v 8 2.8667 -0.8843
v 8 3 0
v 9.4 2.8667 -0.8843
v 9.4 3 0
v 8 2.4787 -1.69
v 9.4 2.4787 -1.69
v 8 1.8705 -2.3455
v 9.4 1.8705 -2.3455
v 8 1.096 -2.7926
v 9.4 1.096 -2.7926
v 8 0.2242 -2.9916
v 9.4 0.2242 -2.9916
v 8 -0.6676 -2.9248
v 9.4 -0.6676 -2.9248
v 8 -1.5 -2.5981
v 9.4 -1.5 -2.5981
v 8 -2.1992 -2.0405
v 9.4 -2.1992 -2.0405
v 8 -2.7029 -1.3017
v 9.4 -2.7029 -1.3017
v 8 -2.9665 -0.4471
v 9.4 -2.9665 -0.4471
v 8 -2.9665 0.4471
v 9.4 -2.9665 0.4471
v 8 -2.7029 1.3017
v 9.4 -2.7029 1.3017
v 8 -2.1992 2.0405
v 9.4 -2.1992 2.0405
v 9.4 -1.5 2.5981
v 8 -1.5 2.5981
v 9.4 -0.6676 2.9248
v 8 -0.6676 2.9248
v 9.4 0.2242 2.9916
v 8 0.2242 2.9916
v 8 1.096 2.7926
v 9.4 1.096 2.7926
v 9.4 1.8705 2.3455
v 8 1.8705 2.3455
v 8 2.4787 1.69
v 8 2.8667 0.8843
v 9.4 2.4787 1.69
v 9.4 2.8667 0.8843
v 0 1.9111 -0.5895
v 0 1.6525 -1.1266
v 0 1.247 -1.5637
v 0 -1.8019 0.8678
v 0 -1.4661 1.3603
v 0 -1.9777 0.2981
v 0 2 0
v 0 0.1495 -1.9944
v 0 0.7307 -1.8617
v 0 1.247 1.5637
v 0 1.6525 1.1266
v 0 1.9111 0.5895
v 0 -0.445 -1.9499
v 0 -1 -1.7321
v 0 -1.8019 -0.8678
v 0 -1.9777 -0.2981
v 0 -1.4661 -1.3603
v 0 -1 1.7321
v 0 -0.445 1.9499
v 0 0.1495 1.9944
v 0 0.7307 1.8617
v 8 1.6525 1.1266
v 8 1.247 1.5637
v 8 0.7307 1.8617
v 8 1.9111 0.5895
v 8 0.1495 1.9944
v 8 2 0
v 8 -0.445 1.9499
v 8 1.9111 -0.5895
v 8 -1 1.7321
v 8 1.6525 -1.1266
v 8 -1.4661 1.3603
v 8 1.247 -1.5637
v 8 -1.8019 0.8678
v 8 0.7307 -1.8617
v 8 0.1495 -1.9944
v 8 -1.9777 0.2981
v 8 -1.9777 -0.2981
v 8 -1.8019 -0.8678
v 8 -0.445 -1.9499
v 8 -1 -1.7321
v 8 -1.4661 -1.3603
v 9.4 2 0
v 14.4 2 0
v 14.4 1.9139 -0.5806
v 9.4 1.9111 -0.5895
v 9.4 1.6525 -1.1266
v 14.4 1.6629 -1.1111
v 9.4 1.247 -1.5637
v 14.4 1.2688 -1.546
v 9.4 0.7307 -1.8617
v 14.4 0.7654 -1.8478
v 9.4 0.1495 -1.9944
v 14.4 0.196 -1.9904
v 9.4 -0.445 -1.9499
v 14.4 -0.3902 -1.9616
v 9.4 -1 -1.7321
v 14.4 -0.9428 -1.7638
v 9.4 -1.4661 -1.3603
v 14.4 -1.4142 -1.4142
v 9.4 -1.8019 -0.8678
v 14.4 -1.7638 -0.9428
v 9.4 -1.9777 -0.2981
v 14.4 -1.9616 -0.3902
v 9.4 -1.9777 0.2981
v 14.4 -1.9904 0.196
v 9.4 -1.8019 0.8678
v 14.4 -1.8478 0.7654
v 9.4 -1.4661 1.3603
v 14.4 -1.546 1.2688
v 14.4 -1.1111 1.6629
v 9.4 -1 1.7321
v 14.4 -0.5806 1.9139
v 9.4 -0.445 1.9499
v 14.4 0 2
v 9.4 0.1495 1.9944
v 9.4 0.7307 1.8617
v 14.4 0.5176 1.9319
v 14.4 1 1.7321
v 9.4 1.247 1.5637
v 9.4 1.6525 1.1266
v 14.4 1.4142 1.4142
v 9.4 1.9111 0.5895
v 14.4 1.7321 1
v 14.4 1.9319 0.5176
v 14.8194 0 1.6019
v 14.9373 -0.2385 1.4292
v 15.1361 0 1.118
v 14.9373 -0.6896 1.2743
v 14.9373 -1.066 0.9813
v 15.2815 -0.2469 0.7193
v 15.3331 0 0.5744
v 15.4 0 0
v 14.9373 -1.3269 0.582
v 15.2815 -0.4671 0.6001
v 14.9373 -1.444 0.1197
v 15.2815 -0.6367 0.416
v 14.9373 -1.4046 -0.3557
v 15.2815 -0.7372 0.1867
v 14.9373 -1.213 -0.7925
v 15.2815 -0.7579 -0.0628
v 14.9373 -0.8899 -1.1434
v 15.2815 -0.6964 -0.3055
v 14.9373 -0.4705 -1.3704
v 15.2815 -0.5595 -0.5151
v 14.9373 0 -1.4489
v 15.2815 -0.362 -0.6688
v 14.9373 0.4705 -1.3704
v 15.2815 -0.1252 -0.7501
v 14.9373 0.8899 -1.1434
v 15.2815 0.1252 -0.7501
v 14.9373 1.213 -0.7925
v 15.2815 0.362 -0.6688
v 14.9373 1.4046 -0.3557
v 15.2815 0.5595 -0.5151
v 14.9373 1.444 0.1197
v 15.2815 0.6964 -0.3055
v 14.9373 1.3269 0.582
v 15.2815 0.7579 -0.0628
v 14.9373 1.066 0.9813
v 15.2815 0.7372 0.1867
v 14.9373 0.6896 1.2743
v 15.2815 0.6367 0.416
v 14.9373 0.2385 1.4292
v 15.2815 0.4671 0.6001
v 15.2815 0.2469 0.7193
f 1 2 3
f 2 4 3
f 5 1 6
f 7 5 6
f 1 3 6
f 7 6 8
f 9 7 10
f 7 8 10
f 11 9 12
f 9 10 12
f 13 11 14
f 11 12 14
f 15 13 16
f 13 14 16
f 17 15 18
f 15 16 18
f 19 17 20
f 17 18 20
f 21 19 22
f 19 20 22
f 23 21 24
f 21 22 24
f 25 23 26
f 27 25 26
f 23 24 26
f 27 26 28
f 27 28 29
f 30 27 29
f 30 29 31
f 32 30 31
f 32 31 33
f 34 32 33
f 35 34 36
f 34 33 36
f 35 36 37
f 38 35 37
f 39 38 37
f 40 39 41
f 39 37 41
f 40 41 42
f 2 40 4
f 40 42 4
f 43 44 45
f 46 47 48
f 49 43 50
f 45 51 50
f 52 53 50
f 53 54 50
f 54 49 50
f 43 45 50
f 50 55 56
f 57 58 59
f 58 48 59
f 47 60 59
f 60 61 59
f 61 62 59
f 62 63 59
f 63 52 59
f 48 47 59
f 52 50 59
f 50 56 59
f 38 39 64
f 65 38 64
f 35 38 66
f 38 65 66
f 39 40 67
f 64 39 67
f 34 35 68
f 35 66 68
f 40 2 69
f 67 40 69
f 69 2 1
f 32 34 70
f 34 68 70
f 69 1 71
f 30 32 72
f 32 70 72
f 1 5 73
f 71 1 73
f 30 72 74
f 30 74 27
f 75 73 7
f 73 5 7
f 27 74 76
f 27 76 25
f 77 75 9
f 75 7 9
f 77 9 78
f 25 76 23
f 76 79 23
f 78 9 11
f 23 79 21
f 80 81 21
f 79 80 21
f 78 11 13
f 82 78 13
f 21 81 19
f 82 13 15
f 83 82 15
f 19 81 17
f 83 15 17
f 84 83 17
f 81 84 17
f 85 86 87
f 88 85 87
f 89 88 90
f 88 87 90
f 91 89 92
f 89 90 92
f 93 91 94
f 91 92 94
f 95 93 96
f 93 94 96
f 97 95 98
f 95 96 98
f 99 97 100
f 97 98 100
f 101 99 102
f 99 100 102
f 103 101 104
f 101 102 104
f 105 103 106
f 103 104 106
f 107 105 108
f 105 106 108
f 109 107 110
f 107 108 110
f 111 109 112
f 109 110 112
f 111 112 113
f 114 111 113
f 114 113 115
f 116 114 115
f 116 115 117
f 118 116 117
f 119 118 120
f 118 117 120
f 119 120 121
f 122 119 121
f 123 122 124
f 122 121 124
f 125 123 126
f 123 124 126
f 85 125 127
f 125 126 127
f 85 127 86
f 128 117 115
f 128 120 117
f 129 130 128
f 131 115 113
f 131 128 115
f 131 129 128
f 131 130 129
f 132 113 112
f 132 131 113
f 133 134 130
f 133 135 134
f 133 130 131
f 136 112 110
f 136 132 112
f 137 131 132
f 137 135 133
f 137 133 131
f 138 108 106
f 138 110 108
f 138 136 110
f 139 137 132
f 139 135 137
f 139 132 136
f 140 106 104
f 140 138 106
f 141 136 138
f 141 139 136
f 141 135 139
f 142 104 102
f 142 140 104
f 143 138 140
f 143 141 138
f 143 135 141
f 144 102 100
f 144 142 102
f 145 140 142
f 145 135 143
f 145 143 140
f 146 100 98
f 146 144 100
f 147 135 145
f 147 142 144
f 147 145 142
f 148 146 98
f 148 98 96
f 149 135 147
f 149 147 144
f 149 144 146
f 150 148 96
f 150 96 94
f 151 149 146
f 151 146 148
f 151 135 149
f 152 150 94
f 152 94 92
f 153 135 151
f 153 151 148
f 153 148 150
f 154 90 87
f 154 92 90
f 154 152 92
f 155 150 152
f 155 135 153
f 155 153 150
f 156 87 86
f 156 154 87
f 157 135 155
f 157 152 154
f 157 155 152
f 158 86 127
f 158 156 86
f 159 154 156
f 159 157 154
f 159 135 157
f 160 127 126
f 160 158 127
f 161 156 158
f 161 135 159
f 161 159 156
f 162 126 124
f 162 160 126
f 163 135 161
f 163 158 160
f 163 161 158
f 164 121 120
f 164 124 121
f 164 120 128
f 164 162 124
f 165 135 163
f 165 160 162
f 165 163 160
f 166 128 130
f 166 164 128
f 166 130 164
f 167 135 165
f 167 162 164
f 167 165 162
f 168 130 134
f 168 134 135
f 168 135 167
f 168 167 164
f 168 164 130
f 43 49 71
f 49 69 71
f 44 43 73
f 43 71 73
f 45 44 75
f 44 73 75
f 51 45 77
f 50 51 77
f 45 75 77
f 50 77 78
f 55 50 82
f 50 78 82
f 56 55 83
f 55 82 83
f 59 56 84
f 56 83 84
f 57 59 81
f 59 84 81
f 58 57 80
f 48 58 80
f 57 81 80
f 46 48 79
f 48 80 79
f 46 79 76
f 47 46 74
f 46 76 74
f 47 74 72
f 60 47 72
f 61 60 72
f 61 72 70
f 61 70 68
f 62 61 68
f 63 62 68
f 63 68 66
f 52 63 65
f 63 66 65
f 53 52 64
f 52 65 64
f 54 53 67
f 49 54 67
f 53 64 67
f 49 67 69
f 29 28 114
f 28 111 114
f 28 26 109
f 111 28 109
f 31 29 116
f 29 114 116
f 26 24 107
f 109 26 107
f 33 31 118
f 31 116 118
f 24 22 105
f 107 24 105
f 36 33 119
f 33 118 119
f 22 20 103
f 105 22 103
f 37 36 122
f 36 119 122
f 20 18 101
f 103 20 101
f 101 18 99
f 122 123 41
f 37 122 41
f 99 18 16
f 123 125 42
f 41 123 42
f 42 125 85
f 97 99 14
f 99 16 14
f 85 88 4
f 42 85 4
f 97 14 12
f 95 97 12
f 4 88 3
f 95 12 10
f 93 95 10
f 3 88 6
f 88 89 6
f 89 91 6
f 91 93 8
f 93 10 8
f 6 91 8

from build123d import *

# Parameters (mm, degrees)
D_ME1_FACE_RADIUS = 2
D_ME1_HEIGHT      = 1


with BuildPart() as part:
    # Esquisse1 → Révolution1 (revolve)
    with BuildSketch(Plane.XY):
        Polygon((0, 0), (0, 2), (8, 2), (8, 3), (9.4, 3), (9.4, 2), (14.4, 2), (14.4, 0), align=None)
    revolve(axis=Axis((14.4, 0, 0), (-1, 0, 0)))

    # Dôme1: a dome of height H over a round flat face of radius A is a cap of a sphere of radius (A * A + H * H) / (2 * H)
    d_me1_r = (D_ME1_FACE_RADIUS * D_ME1_FACE_RADIUS + D_ME1_HEIGHT * D_ME1_HEIGHT) / (2 * D_ME1_HEIGHT)
    d_me1_base = Plane((14.4, 0, 0), z_dir=(1, 0, 0))
    with Locations(d_me1_base.offset(D_ME1_HEIGHT - d_me1_r)):
        d_me1_ball = Sphere(d_me1_r, mode=Mode.PRIVATE)
    add(split(d_me1_ball, bisect_by=d_me1_base, keep=Keep.TOP, mode=Mode.PRIVATE))


solid = part.part
